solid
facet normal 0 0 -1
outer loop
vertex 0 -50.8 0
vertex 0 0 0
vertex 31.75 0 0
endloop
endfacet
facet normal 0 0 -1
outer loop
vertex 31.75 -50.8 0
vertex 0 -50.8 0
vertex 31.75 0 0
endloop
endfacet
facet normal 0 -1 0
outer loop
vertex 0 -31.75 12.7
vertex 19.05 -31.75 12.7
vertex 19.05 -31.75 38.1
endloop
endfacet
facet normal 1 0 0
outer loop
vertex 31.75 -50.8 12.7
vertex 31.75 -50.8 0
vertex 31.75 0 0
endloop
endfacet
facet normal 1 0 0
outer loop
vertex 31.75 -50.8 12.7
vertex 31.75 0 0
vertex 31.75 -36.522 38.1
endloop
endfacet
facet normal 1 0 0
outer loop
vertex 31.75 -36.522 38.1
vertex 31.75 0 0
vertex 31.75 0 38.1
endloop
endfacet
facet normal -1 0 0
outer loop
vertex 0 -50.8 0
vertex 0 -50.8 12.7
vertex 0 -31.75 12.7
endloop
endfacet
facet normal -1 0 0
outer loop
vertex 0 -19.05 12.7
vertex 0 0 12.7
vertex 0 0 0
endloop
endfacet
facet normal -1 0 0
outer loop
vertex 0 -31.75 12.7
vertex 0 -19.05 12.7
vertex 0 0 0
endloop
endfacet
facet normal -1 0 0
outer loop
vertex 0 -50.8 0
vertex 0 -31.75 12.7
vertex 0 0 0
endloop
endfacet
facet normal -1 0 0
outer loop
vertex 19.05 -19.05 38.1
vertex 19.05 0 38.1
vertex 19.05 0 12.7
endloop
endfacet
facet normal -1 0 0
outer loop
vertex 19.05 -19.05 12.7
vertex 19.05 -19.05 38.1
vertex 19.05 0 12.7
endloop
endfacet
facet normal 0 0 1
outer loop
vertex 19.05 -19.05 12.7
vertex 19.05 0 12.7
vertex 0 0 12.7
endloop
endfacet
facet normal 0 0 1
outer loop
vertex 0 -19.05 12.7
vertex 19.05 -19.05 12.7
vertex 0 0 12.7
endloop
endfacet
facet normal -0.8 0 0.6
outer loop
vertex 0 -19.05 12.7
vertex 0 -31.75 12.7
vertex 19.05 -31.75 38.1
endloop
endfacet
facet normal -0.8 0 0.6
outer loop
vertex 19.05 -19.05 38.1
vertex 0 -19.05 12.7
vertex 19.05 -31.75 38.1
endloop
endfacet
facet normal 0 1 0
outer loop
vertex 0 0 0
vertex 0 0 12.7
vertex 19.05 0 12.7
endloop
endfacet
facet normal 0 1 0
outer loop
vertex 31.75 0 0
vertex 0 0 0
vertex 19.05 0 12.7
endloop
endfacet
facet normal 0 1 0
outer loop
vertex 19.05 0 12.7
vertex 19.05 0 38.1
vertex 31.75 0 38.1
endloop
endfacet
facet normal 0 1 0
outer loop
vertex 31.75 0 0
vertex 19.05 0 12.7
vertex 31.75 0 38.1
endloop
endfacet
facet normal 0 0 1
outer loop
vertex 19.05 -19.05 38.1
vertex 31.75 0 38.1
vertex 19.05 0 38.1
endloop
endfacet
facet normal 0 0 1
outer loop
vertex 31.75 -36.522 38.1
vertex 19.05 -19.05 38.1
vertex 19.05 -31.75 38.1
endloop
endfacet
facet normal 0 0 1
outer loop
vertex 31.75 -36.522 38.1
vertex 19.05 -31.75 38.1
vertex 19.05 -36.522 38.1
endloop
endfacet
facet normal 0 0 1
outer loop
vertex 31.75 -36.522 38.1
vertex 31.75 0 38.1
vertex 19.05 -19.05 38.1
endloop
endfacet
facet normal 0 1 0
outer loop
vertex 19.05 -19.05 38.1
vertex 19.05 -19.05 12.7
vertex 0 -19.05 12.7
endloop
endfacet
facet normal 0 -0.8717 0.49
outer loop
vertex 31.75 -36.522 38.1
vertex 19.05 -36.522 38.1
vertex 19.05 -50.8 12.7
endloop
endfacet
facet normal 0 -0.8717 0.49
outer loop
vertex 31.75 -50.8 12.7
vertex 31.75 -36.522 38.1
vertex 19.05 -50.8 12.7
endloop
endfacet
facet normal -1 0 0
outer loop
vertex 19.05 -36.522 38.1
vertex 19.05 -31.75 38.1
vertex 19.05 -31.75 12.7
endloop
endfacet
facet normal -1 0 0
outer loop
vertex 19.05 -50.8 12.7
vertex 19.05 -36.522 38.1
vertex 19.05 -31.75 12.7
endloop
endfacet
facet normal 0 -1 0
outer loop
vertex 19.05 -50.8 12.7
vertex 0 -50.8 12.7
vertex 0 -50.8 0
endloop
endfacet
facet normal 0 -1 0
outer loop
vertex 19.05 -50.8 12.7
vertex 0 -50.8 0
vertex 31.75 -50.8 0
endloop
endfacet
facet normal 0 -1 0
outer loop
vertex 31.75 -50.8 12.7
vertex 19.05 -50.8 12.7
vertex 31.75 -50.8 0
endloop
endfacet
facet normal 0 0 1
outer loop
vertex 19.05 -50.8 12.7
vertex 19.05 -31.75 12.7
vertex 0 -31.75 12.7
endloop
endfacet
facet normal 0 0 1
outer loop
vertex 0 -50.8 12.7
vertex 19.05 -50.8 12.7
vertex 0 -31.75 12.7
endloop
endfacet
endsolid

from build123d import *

# Parameters (mm, degrees)
F1_DEPTH = 50.8
F3_DEPTH = 25.4
F4_W     = 12.7
F4_H     = 25.4
F5_DEPTH = 19.05
F7_DEPTH = 25.4


with BuildPart() as f1:
    # F0 (on Front) → F1 (new body)
    with BuildSketch(Plane.XZ):
        Polygon((0, 12.7), (0, 0), (31.75, 0), (31.75, 38.1), (19.05, 38.1), (19.05, 12.7), align=None)
    extrude(amount=F1_DEPTH)

    # F2 (on face) → F3 (cut)
    with BuildSketch(Plane(origin=(19.05, 0, 0), x_dir=(0, -1, 0), z_dir=(-1, 0, 0))):
        Polygon((36.5225, 38.1), (50.8, 12.7), (50.8, 38.1), align=None)
    extrude(amount=-F3_DEPTH, mode=Mode.SUBTRACT)

    # F4 (on face) → F5 (join)
    with BuildSketch(Plane(origin=(19.05, 0, 0), x_dir=(0, -1, 0), z_dir=(-1, 0, 0))):
        with Locations((25.4, 25.4)):
            Rectangle(F4_W, F4_H)
    extrude(amount=F5_DEPTH)

    # F6 (on face) → F7 (cut)
    with BuildSketch(Plane.XZ.offset(31.75)):
        Polygon((0, 12.7), (19.05, 38.1), (0, 38.1), align=None)
    extrude(amount=-F7_DEPTH, mode=Mode.SUBTRACT)


solid = f1.part
